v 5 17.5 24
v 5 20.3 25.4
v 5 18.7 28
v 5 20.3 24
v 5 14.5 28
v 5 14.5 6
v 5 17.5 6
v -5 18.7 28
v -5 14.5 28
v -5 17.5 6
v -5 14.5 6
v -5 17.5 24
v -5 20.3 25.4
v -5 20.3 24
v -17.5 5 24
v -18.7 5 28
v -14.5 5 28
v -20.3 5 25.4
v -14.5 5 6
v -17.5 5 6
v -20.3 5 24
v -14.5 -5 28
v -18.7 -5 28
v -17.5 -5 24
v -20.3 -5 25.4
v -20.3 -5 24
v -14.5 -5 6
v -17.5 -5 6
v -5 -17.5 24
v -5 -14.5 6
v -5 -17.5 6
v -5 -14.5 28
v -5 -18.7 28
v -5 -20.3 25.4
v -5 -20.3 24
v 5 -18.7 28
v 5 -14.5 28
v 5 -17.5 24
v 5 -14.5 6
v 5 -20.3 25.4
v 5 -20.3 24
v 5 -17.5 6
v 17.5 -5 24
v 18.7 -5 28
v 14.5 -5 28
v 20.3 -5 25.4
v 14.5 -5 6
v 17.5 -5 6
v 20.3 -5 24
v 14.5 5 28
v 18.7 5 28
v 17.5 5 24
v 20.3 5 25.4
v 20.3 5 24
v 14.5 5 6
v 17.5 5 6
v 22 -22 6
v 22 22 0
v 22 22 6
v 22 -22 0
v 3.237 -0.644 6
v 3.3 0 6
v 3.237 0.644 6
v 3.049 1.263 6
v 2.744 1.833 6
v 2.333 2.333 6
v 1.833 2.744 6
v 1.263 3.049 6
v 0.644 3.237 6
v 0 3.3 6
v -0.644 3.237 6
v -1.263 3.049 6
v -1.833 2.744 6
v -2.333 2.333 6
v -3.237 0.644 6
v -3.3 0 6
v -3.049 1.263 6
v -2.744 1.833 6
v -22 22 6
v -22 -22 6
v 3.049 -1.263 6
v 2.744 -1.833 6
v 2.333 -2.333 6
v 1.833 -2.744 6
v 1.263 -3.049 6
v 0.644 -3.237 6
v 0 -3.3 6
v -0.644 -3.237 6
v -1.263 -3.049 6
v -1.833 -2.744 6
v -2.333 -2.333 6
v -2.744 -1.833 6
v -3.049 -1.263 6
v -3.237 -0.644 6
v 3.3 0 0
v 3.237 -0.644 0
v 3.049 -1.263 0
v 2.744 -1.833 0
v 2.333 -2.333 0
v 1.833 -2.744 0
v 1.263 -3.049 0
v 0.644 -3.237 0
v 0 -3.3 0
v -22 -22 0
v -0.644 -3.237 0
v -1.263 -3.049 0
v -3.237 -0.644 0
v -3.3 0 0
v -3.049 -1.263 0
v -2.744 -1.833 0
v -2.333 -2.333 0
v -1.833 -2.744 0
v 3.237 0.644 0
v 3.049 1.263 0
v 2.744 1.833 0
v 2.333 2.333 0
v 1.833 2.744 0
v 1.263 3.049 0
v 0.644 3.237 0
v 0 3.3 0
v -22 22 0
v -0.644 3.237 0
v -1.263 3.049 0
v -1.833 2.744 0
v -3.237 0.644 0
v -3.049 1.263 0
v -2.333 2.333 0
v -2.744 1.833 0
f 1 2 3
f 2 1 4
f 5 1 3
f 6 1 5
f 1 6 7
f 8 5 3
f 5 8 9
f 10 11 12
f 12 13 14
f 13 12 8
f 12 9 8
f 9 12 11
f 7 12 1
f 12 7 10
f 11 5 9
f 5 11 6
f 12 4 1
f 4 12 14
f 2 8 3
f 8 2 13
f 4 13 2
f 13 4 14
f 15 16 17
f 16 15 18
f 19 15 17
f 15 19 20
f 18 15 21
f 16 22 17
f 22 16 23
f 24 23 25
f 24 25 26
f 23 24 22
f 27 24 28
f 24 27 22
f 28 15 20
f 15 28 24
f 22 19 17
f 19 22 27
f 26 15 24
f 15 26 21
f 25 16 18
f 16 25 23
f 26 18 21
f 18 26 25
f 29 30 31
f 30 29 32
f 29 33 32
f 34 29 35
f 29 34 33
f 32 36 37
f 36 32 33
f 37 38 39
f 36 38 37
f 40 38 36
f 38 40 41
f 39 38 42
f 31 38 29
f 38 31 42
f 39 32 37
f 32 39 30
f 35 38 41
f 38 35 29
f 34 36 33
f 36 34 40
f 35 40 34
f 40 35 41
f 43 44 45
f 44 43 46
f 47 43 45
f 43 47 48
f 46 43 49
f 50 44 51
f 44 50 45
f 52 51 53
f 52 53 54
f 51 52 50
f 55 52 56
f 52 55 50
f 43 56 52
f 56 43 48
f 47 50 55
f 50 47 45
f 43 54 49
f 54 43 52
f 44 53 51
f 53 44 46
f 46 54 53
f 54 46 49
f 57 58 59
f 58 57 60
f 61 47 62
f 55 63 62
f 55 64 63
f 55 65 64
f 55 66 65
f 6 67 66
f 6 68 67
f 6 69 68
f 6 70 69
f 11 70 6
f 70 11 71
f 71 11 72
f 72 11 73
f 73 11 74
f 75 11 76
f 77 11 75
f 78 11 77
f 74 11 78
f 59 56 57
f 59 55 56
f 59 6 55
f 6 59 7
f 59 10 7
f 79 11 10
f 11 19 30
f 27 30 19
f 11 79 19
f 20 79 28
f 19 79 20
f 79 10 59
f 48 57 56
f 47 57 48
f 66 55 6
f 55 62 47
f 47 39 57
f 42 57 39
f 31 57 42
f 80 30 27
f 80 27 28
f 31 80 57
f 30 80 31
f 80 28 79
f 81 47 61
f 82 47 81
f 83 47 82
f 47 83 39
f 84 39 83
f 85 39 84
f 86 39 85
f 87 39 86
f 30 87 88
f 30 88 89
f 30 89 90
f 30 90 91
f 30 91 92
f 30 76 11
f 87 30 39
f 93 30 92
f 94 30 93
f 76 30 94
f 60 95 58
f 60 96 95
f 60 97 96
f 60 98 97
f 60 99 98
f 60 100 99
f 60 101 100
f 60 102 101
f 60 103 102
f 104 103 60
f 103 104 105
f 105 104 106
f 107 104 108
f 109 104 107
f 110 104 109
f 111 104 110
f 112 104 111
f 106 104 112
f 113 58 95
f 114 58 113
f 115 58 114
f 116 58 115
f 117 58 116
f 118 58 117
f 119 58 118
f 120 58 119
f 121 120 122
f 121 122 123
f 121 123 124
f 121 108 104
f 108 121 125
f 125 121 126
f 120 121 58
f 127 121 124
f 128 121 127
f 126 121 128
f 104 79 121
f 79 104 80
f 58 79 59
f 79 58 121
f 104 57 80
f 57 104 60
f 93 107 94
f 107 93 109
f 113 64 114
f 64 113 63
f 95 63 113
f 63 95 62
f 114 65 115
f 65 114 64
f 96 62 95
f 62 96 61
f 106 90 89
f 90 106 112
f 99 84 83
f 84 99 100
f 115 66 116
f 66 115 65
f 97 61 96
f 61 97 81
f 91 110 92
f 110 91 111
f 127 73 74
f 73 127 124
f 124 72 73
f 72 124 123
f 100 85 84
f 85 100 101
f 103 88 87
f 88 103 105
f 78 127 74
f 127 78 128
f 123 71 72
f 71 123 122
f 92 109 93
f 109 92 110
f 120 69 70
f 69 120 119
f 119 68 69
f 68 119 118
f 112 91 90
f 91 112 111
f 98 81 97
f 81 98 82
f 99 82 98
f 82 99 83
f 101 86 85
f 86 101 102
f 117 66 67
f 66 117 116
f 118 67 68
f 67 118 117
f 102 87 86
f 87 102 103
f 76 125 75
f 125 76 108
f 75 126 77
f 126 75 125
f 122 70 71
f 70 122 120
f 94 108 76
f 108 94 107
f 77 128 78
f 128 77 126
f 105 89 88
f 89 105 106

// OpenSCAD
$fn = 32;

// ----------------------------------------------------------------------
// Snap-fit latch: 4 arms, 22 mm tall, 3 mm undercut hooks
// ----------------------------------------------------------------------

// --- parameters (mm) ---
base_d = 44;              // base plate depth
base_h = 6;               // base plate thickness
span = 32;                // distance between opposite arms
arm_t = 3;                // arm thickness
arm_d = 10;               // arm width
height = 22;              // free arm length
head_len = 3;             // hook reach
head_h = 4;               // hook height
lead = 1.4;               // lead-in ramp thickness
bore_d = 6.6;             // base fixing bore
top_z = 28;               // height of the arm tips above the base

arms = 4;

difference() {
  union() {
    /* base plate, centred on the arm ring */
    translate([-22, -22, 0]) cube([base_d, base_d, base_h]);
    for (a = [0 : 360 / arms : 359]) rotate([0, 0, a]) {
    /* arm, sunk 0.5 mm into the base */
    translate([-arm_d / 2, span / 2 - arm_t / 2, base_h - 0.5]) cube([arm_d, arm_t, height + 0.5]);
    /* hook: a convex hull of a tall inner block and a thin outer lip
       gives a flat undercut below and a lead-in ramp on top */
    hull() {
      translate([-arm_d / 2, span / 2 + arm_t / 2 - 0.6, top_z - head_h]) cube([arm_d, lead + 0.4, head_h]);
      translate([-arm_d / 2, span / 2 + arm_t / 2 - 0.2, top_z - head_h]) cube([arm_d, head_len, lead]);
    }
    }
  }
  translate([0, 0, -2.5]) cylinder(h = base_h + 5, d = bore_d);
}
